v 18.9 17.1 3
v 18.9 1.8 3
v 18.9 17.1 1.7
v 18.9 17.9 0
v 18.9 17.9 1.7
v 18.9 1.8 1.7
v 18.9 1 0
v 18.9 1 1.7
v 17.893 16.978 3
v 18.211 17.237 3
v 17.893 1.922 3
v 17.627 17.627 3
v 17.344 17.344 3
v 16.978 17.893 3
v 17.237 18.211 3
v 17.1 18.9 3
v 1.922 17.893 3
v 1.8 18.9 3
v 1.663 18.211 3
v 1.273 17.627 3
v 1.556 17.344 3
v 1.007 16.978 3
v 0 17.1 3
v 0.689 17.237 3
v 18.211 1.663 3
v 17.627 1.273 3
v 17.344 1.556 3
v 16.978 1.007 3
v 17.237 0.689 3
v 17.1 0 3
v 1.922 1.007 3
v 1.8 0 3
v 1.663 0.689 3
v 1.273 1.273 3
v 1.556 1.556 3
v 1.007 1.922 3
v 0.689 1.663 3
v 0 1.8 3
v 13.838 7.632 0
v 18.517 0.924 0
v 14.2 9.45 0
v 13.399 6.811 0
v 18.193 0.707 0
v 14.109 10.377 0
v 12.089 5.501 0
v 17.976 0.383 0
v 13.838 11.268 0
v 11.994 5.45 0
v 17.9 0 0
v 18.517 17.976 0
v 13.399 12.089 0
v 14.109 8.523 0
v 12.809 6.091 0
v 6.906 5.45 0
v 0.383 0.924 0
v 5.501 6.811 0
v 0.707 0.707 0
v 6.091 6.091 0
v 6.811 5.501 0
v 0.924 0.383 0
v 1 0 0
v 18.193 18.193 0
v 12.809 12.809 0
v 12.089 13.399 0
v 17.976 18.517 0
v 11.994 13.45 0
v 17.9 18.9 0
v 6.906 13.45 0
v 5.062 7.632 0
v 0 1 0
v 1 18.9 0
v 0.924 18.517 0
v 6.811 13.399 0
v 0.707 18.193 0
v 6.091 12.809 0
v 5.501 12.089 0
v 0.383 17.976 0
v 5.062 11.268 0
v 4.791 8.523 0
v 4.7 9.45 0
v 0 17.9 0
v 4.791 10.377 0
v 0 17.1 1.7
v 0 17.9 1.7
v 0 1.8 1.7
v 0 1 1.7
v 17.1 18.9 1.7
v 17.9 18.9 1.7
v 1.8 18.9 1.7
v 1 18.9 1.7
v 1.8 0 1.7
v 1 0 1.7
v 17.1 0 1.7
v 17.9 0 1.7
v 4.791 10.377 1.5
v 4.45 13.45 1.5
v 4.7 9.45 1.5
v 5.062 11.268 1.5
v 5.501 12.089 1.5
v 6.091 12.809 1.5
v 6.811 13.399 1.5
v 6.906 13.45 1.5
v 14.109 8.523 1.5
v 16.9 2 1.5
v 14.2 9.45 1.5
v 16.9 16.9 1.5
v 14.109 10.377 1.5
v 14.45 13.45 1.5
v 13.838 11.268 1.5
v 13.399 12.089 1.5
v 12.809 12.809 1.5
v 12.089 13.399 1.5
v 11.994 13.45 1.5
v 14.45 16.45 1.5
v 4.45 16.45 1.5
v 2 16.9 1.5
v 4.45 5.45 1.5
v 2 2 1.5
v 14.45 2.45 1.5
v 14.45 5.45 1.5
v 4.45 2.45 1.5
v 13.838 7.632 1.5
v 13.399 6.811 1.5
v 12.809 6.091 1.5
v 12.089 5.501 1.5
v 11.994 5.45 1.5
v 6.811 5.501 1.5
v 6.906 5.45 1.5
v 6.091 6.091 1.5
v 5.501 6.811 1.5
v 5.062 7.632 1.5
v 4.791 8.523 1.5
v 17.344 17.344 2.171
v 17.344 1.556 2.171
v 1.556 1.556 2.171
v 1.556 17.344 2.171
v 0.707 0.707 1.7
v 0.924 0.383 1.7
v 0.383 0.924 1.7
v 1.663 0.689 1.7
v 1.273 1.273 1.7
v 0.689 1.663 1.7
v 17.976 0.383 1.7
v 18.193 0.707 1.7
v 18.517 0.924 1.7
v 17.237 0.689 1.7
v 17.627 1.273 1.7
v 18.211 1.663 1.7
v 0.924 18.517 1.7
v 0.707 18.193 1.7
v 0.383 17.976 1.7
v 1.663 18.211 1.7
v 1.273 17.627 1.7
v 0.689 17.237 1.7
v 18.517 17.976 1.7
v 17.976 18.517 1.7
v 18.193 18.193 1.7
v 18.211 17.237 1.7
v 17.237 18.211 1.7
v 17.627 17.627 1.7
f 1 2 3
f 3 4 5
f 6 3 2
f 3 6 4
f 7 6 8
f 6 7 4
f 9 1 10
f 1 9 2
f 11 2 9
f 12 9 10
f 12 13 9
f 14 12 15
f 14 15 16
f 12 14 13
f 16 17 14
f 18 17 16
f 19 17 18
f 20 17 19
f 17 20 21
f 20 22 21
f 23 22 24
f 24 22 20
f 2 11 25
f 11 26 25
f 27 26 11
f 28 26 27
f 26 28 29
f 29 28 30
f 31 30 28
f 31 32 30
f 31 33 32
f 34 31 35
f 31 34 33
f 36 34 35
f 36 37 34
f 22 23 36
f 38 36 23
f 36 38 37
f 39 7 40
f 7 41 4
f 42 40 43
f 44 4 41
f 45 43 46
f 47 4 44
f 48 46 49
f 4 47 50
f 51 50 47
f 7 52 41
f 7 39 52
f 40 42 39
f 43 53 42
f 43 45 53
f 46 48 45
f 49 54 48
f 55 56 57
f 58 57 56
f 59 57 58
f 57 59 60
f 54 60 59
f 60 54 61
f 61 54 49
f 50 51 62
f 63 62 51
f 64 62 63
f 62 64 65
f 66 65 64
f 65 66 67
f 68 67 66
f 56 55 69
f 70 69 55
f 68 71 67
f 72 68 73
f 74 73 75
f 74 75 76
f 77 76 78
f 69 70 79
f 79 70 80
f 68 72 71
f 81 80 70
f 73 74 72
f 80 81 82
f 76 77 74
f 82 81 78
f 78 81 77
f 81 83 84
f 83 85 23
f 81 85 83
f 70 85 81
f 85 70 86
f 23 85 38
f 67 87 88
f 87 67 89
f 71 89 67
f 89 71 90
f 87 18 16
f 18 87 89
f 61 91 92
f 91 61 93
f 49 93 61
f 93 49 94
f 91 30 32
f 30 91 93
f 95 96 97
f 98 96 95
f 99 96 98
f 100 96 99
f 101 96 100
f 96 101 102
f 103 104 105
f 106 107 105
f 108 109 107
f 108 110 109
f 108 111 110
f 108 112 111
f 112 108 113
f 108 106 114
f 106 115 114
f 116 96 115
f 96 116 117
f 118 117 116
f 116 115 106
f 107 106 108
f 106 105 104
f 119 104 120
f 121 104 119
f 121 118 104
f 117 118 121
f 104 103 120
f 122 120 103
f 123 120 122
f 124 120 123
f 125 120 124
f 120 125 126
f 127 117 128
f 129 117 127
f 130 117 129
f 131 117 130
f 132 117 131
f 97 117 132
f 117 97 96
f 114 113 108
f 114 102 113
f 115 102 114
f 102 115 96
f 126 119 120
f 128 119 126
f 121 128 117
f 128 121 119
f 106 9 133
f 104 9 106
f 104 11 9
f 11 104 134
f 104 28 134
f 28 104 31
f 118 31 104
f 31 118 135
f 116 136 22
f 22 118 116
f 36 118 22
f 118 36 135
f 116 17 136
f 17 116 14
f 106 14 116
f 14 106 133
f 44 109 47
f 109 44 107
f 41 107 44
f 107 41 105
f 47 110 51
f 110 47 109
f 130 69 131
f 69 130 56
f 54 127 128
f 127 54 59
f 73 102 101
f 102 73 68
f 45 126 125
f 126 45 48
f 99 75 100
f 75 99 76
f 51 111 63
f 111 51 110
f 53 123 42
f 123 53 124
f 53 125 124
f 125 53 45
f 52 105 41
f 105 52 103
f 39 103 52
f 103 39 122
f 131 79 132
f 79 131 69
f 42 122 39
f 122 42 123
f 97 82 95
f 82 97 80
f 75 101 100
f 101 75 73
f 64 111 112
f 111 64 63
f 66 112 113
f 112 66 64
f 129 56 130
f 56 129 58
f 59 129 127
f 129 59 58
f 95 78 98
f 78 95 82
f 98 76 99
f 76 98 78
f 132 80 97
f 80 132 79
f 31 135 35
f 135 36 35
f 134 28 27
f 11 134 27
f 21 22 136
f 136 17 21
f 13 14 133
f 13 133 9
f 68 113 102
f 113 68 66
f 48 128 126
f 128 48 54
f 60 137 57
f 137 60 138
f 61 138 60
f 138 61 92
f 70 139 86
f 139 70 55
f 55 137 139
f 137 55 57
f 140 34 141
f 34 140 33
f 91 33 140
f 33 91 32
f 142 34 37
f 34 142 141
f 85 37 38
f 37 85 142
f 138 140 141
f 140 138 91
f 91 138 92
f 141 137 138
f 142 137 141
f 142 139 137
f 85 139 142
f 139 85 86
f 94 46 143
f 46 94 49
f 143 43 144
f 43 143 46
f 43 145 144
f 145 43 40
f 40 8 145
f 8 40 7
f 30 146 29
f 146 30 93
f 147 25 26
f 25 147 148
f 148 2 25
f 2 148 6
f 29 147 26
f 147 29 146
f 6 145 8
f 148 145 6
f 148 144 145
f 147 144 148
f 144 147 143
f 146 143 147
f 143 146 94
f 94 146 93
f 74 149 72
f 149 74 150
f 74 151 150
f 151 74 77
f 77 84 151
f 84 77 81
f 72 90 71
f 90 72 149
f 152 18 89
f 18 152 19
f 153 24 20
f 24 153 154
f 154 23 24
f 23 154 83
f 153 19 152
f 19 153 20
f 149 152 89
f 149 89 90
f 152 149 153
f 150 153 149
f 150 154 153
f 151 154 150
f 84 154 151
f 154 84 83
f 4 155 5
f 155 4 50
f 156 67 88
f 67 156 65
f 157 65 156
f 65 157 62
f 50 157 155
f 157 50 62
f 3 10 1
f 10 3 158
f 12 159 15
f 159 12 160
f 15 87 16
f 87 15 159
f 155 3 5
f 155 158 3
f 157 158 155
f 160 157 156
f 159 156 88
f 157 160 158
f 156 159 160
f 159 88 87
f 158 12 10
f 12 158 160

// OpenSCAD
//OpenSCAD-Skript

//Moduldefinition mit Parametern für Frontplattensystem im 19mm-Raster
module FrontElem (
//Frontplattenelement
xwert=1,        //Anzahl der Segmente in horizontaler Richtung
ywert=1,        //Anzahl der Segmente in vertikaler Richtung
segment=18.9,   //Kantenlänge des Segments
hght=3.0,       //Höhe des Rands des Frontplattensegments
thick=1.5,      //verbleibende Dicke des Frontplattensegments
wo=1.0,         //Wandstärke oben
wu=2.0,         //Wandstärke unten
//M3-Schrauben
M3=false,       //Bohrungen für M3-Zylinderkopf-Inbusschraube
skd3=5.6,       //Schraubenkopfdurchmesser M3-Schraube
skh3=3.3,       //Schraubenkopfhöhe M3-Schraube
dsh3=3.1,       //Schaftdurchmesser M3-Schraube
dvst3=7,        //Verstärkung für M3-Schraube
//Schneidschrauben 2mmx6mm
B2mm=true,      //Bohrungen für 2mm-Schneidschrauben
skd2=3.6,       //Schraubenkopfdurchmesser 2mm-Schraube (4.4)
skh2=1.3,       //Schraubenkopfhöhe 2mm-Schraube
dsh2=2.0,       //Schaftdurchmesser 2mm-Schraube
dvst2=4.4,      //Verstärkung für 2mm-Schraube
//Beschriftungsfeld eingesenkt
Btext=6.0,      //Breite Beschriftungsband
Ltext=12,       //Länge Beschriftungsband
Dtext=0.3,      //Tiefe Beschriftungsfeld, oder Null
//LED 3mm
LEDdia=3.0,     //Durchmesser LED
//Quadrat-LED
LEDr=5.0,       //Kantenlänge quadratische LED
//Rechteck-LED
LEDB=5.0,       //Breite der Rechteck-LED
LEDH=3.0,       //Höhe der Rechteck-LED
//Hebel-Kippschalter
KSWdia=6.0,     //Schaftdurchmesser Kippschalter
//Drehschalter
RSWdia=9.2,     //Schaftdurchmesser Drehschalter
RSWdist=9.4,    //Mittenabstand Pin
RSWpin=3.0,     //Durchmesser Pin
//Bohrung für Potischaft 6mm
POTdia=6.8,     //Schaftdurchmesser Poti
//Polklemme M4
TRMdia=4.0,     //Bohrung für Polklemme M4
TRSdia=6.0,     //Bohrung für Telefonbuchse 4mm
//MC-Einbaubuchse
MCdia=11.8,     //Bohrung für MC-Buchse 4mm
MCdist=10.4,    //Abstand Abflachungen
//BNC-Einbaubuchse
BNCdia=9.5,     //Durchmesser Bohrung
BNCdist=8.0,    //Abstand Abflachung
//Panelmeter 3-stellig
PM3B=22.5,      //Breite Panelmeter 3-stellig
PM3H=14.5,      //Höhe Panelmeter 3-stellig
//Panelmeter 4-stellig
PM4B=30.0,      //Breite Panelmeter 4-stellig
PM4H=14.2,      //Höhe Panelmeter 4-stellig
//Kaltgerätestecker
KGSW=27.3,      //Länge Ausschnitt in x-Richtung Kaltgerätestecker
KGSH=20,        //Höhe Ausschnitt in y-Richtung Kaltgerätestecker
KGSR=9          //Rundungsdurchmesser Ausschnitt Kaltgerätestecker
)
//Beginn Modul
{
difference(){   //difference 1
union(){        //union 1
difference(){   //difference 2
union(){        //union 2
    //alles, was vor der nächsten geschweiften Klammer steht, wird zusammengefügt (union 2)
//Körper des Frontplattensegments
cube([xwert*segment, ywert*segment, hght]);


}               //union 2 end
    //alles, was vor der nächsten geschweiften Klammer steht, wird davon abgezogen (difference 2)
//Einsenkung in das Segment
polyhedron(
               points= [[wu,wu,thick],                                  //0 unten
                        [xwert*segment-wu,wu,thick],                    //1 unten
                        [xwert*segment-wu,ywert*segment-wu,thick],      //2 unten
                        [wu,ywert*segment-wu,thick],                    //3 unten
                        [wo,wo,hght+0.01],                              //4 oben
                        [wo,ywert*segment-wo, hght+0.01],               //5 oben
                        [xwert*segment-wo,ywert*segment-wo,hght+0.01],  //6 oben
                        [xwert*segment-wo,wo,hght+0.01],                //7 oben
                       ],
               faces=  [[0,1,2,3],      //Boden
                        [0,4,7,1],      //Deckel
                        [1,7,6,2],      //Front
                        [2,6,5,3],      //Seitenwand rechts
                        [3,5,4,0],      //Rückwand
                        [4,5,6,7]]      //Seitenwand links
               );   


/*
//Ausschnitt Schalter
translate([xwert*segment/2-30/2,ywert*segment/2-5.5,-0.1]) cube([30,11,20]);
*/

/*
//Ausschnitt Kaltgerätestecker
translate([0,7,0]) {
//Mittenausschnitt
translate([xwert*segment/2-22/2,ywert*segment/2-14,-0.1]) cube([22,14,20]);
//Rundungen
translate([xwert*segment/2-22/2,ywert*segment/2-14,-0.1])cylinder(d=8,h=20,$fn=32);
translate([xwert*segment/2-22/2,ywert*segment/2,-0.1])cylinder(d=8,h=20,$fn=32);
translate([xwert*segment/2+22/2,ywert*segment/2-14,-0.1])cylinder(d=8,h=20,$fn=32);
translate([xwert*segment/2+22/2,ywert*segment/2,-0.1])cylinder(d=8,h=20,$fn=32);
//Seitensegmente
translate([xwert*segment/2-22/2,ywert*segment/2-0.1,-0.1]) cube([22,4+0.1,20]);
translate([xwert*segment/2-22/2,ywert*segment/2-14-4,-0.1]) cube([22,4+0.1,20]);
translate([xwert*segment/2-22/2-4,ywert*segment/2-14,-0.1]) cube([4+0.1,14,20]);
translate([xwert*segment/2+22/2-0.1,ywert*segment/2-14,-0.1]) cube([4+0.1,14,20]);
//Schraubenlöcher
translate([xwert*segment/2-36/2,ywert*segment/2-14/2,-0.1])cylinder(d=4,h=20,$fn=32);
translate([xwert*segment/2+36/2,ywert*segment/2-14/2,-0.1])cylinder(d=4,h=20,$fn=32);
*/

/*
//Bohrung für LED mittig (Mindestgröße 1x1)
translate([xwert*segment/2,ywert*segment/2-3,-0.1])  cylinder(d=LEDdia, h=10, $fn=32);
*/

/*
//Bohrung für 2x 3mm-LED nach unten versetzt mit Textfeld darüber (Mindestgröße 1x1, bei 10mm LED 1x2)
translate([xwert*segment/2-3,ywert*segment/2-3,-0.1])  cylinder(d=LEDdia, h=10, $fn=32);
translate([xwert*segment/2+3,ywert*segment/2-3,-0.1])  cylinder(d=LEDdia, h=10, $fn=32);
translate([xwert*segment/2-Ltext/2,ywert*segment/2,thick-Dtext+0.05])  cube([Ltext, Btext, Dtext]); 
*/

/*
//Bohrung für Kippschalter mittig (Mindestgröße 1x1)
translate([xwert*segment/2,ywert*segment/2,-0.1])  cylinder(d=KSWdia, h=10, $fn=32); 
*/

/*
//Bohrungen für Drehschalter mit Pin (Mindestgröße 2x2)
translate([xwert*segment/2,ywert*segment/2,-0.1])  cylinder(d=RSWdia, h=10, $fn=32);
translate([xwert*segment/2+RSWdist,ywert*segment/2,-0.1])  cylinder(d=RSWpin, h=1.5, $fn=32);
*/

/*
//Bohrung für Potentiometer 3mm-Schaft (Mindestgröße 1x1)
translate([xwert*segment/2,ywert*segment/2,-0.1])  cylinder(d=POTdia, h=10, $fn=32);
*/

/*
//Bohrung für 2x 4mm-Polklemme M4 (Mindestgröße 1x1)
translate([xwert*segment/2-10,ywert*segment/2,-0.1])  cylinder(d=TRMdia, h=10, $fn=32);
translate([xwert*segment/2+10,ywert*segment/2,-0.1])  cylinder(d=TRMdia, h=10, $fn=32);
*/
/*
//Bohrung für 4mm-Telefonbuchse (Mindestgröße 1x1)
translate([xwert*segment/2,ywert*segment/2,-0.1])  cylinder(d=TRSdia, h=10, $fn=32);
*/

/*
//Bohrung für 4mm-MC-Buchse (Mindestgröße 2x2), siehe auch union1 für Abflachungen
translate([xwert*segment/2,ywert*segment/2,-0.1])  cylinder(d=MCdia, h=10, $fn=32);
*/


//Bohrung für BNC-Buchse (Mindestgröße 1x1), siehe auch union1 für Abflachungen
translate([xwert*segment/2,ywert*segment/2,-0.1])  cylinder(d=BNCdia, h=10, $fn=32);


/*
//Ausschnitt Panelmeter 3-stellig (Mindestgröße 2x1)
translate([xwert*segment/2-PM3B/2,ywert*segment/2-PM3H/2,-0.1])  cube([PM3B, PM3H, 10]);
*/

/*
//Ausschnitt Panelmeter 4-stellig (Mindestgröße 2x1)
translate([xwert*segment/2-PM4B/2,ywert*segment/2-PM4H/2,-0.1])  cube([PM4B, PM4H, 10]);
*/       
        
}  //difference 2 end
    //alles, was vor der nächsten geschweiften Klammer steht, wird dazu hinzugefügt (union 1)
//Verstärkungen für Schrauben x-Achse unten
for (x=[0:segment:xwert*segment])
{
if (M3==true) translate([x,0,0]) cylinder(d=dvst3,h=hght,$fn=16);
if (B2mm==true) translate([x,0,0]) cylinder(d=dvst2,h=hght,$fn=16);
}
//Verstärkungen für Schrauben x-Achse oben
for (x=[0:segment:xwert*segment])
{
if (M3==true) translate([x,ywert*segment,0]) cylinder(d=dvst3,h=hght,$fn=16);
if (B2mm==true) translate([x,ywert*segment,0]) cylinder(d=dvst2,h=hght,$fn=16);
}
//Verstärkungen für Schrauben y-Achse links
for (y=[0:segment:ywert*segment])
{
if (M3==true) translate([0,y,0]) cylinder(d=dvst3,h=hght,$fn=16);
if (B2mm==true) translate([0,y,0]) cylinder(d=dvst2,h=hght,$fn=16);
}
//Verstärkungen für Schrauben y-Achse rechts
for (y=[0:segment:ywert*segment])
{
if (M3==true) translate([xwert*segment,y,0]) cylinder(d=dvst3,h=hght,$fn=16);
if (B2mm==true) translate([xwert*segment,y,0]) cylinder(d=dvst2,h=hght,$fn=16);
}

/*
//Abflachungen für 4mm-MC-Buchse (Mindestgröße 2x2)
translate([xwert*segment/2-5,ywert*segment/2+MCdist/2,0])  cube([10,3,thick]);
translate([xwert*segment/2-5,ywert*segment/2-MCdist/2-3,0])  cube([10,3,thick]);
*/


//Abflachungen für BNC-Buchse (Mindestgröße 1x1)
translate([xwert*segment/2-5,ywert*segment/2+BNCdist/2,0])  cube([10,3,thick]);
translate([xwert*segment/2-5,ywert*segment/2-BNCdist/2-3,0])  cube([10,3,thick]);


}               //union 1 end
    //alles, was vor der nächsten geschweiften Klammer steht, wird davon wieder abgezogen (difference 1)
//Bohrungen für Schrauben x-Achse unten
for (x=[0:segment:xwert*segment])
{
if (M3==true) translate([x,0,-0.1]) cylinder(d=dsh3,h=2*hght,$fn=16);
if (M3==true) translate([x,0,hght-skh3]) cylinder(d=skd3,h=2*hght,$fn=16);
if (B2mm==true) translate([x,0,-0.1]) cylinder(d=dsh2,h=2*hght,$fn=16);
if (B2mm==true) translate([x,0,hght-skh2]) cylinder(d=skd2,h=2*hght,$fn=16); 
}
//Bohrungen für Schrauben x-Achse oben
for (x=[0:segment:xwert*segment])
{
if (M3==true) translate([x,ywert*segment,-0.1]) cylinder(d=dsh3,h=2*hght,$fn=16);
if (M3==true) translate([x,ywert*segment,hght-skh3]) cylinder(d=skd3,h=2*hght,$fn=16);
if (B2mm==true) translate([x,ywert*segment,-0.1]) cylinder(d=dsh2,h=2*hght,$fn=16);
if (B2mm==true) translate([x,ywert*segment,hght-skh2]) cylinder(d=skd2,h=2*hght,$fn=16); 
}
//Bohrungen für Schrauben y-Achse links
for (y=[0:segment:ywert*segment])
{
if (M3==true) translate([0,y,-0.1]) cylinder(d=dsh3,h=2*hght,$fn=16);
if (M3==true) translate([0,y,hght-skh3]) cylinder(d=skd3,h=2*hght,$fn=16);
if (B2mm==true) translate([0,y,-0.1]) cylinder(d=dsh2,h=2*hght,$fn=16);
if (B2mm==true) translate([0,y,hght-skh2]) cylinder(d=skd2,h=2*hght,$fn=16); 
}
//Bohrungen für Schrauben y-Achse rechts
for (y=[0:segment:ywert*segment])
{
if (M3==true) translate([xwert*segment,y,-0.1]) cylinder(d=dsh3,h=2*hght,$fn=16);
if (M3==true) translate([xwert*segment,y,hght-skh3]) cylinder(d=skd3,h=2*hght,$fn=16);
if (B2mm==true) translate([xwert*segment,y,-0.1]) cylinder(d=dsh2,h=2*hght,$fn=16);
if (B2mm==true) translate([xwert*segment,y,hght-skh2]) cylinder(d=skd2,h=2*hght,$fn=16); 
}
//Abschneiden Verstärkungen unten
translate([-250,-10,-0.1])
cube([500,10,25]);
//Abschneiden Verstärkungen oben
translate([-250,ywert*segment,-0.1])
cube([500,10,25]);
//Abschneiden Verstärkungen links
translate([-10,-250,-0.1])
cube([10,500,25]);
//Abschneiden Verstärkungen rechts
translate([xwert*segment,-250,-0.1])
cube([10,500,25]);
}               //difference 1 end

}  //module end

//Hier werden Instanzen des Moduls aufgerufen
translate([0,0,0]) FrontElem();
